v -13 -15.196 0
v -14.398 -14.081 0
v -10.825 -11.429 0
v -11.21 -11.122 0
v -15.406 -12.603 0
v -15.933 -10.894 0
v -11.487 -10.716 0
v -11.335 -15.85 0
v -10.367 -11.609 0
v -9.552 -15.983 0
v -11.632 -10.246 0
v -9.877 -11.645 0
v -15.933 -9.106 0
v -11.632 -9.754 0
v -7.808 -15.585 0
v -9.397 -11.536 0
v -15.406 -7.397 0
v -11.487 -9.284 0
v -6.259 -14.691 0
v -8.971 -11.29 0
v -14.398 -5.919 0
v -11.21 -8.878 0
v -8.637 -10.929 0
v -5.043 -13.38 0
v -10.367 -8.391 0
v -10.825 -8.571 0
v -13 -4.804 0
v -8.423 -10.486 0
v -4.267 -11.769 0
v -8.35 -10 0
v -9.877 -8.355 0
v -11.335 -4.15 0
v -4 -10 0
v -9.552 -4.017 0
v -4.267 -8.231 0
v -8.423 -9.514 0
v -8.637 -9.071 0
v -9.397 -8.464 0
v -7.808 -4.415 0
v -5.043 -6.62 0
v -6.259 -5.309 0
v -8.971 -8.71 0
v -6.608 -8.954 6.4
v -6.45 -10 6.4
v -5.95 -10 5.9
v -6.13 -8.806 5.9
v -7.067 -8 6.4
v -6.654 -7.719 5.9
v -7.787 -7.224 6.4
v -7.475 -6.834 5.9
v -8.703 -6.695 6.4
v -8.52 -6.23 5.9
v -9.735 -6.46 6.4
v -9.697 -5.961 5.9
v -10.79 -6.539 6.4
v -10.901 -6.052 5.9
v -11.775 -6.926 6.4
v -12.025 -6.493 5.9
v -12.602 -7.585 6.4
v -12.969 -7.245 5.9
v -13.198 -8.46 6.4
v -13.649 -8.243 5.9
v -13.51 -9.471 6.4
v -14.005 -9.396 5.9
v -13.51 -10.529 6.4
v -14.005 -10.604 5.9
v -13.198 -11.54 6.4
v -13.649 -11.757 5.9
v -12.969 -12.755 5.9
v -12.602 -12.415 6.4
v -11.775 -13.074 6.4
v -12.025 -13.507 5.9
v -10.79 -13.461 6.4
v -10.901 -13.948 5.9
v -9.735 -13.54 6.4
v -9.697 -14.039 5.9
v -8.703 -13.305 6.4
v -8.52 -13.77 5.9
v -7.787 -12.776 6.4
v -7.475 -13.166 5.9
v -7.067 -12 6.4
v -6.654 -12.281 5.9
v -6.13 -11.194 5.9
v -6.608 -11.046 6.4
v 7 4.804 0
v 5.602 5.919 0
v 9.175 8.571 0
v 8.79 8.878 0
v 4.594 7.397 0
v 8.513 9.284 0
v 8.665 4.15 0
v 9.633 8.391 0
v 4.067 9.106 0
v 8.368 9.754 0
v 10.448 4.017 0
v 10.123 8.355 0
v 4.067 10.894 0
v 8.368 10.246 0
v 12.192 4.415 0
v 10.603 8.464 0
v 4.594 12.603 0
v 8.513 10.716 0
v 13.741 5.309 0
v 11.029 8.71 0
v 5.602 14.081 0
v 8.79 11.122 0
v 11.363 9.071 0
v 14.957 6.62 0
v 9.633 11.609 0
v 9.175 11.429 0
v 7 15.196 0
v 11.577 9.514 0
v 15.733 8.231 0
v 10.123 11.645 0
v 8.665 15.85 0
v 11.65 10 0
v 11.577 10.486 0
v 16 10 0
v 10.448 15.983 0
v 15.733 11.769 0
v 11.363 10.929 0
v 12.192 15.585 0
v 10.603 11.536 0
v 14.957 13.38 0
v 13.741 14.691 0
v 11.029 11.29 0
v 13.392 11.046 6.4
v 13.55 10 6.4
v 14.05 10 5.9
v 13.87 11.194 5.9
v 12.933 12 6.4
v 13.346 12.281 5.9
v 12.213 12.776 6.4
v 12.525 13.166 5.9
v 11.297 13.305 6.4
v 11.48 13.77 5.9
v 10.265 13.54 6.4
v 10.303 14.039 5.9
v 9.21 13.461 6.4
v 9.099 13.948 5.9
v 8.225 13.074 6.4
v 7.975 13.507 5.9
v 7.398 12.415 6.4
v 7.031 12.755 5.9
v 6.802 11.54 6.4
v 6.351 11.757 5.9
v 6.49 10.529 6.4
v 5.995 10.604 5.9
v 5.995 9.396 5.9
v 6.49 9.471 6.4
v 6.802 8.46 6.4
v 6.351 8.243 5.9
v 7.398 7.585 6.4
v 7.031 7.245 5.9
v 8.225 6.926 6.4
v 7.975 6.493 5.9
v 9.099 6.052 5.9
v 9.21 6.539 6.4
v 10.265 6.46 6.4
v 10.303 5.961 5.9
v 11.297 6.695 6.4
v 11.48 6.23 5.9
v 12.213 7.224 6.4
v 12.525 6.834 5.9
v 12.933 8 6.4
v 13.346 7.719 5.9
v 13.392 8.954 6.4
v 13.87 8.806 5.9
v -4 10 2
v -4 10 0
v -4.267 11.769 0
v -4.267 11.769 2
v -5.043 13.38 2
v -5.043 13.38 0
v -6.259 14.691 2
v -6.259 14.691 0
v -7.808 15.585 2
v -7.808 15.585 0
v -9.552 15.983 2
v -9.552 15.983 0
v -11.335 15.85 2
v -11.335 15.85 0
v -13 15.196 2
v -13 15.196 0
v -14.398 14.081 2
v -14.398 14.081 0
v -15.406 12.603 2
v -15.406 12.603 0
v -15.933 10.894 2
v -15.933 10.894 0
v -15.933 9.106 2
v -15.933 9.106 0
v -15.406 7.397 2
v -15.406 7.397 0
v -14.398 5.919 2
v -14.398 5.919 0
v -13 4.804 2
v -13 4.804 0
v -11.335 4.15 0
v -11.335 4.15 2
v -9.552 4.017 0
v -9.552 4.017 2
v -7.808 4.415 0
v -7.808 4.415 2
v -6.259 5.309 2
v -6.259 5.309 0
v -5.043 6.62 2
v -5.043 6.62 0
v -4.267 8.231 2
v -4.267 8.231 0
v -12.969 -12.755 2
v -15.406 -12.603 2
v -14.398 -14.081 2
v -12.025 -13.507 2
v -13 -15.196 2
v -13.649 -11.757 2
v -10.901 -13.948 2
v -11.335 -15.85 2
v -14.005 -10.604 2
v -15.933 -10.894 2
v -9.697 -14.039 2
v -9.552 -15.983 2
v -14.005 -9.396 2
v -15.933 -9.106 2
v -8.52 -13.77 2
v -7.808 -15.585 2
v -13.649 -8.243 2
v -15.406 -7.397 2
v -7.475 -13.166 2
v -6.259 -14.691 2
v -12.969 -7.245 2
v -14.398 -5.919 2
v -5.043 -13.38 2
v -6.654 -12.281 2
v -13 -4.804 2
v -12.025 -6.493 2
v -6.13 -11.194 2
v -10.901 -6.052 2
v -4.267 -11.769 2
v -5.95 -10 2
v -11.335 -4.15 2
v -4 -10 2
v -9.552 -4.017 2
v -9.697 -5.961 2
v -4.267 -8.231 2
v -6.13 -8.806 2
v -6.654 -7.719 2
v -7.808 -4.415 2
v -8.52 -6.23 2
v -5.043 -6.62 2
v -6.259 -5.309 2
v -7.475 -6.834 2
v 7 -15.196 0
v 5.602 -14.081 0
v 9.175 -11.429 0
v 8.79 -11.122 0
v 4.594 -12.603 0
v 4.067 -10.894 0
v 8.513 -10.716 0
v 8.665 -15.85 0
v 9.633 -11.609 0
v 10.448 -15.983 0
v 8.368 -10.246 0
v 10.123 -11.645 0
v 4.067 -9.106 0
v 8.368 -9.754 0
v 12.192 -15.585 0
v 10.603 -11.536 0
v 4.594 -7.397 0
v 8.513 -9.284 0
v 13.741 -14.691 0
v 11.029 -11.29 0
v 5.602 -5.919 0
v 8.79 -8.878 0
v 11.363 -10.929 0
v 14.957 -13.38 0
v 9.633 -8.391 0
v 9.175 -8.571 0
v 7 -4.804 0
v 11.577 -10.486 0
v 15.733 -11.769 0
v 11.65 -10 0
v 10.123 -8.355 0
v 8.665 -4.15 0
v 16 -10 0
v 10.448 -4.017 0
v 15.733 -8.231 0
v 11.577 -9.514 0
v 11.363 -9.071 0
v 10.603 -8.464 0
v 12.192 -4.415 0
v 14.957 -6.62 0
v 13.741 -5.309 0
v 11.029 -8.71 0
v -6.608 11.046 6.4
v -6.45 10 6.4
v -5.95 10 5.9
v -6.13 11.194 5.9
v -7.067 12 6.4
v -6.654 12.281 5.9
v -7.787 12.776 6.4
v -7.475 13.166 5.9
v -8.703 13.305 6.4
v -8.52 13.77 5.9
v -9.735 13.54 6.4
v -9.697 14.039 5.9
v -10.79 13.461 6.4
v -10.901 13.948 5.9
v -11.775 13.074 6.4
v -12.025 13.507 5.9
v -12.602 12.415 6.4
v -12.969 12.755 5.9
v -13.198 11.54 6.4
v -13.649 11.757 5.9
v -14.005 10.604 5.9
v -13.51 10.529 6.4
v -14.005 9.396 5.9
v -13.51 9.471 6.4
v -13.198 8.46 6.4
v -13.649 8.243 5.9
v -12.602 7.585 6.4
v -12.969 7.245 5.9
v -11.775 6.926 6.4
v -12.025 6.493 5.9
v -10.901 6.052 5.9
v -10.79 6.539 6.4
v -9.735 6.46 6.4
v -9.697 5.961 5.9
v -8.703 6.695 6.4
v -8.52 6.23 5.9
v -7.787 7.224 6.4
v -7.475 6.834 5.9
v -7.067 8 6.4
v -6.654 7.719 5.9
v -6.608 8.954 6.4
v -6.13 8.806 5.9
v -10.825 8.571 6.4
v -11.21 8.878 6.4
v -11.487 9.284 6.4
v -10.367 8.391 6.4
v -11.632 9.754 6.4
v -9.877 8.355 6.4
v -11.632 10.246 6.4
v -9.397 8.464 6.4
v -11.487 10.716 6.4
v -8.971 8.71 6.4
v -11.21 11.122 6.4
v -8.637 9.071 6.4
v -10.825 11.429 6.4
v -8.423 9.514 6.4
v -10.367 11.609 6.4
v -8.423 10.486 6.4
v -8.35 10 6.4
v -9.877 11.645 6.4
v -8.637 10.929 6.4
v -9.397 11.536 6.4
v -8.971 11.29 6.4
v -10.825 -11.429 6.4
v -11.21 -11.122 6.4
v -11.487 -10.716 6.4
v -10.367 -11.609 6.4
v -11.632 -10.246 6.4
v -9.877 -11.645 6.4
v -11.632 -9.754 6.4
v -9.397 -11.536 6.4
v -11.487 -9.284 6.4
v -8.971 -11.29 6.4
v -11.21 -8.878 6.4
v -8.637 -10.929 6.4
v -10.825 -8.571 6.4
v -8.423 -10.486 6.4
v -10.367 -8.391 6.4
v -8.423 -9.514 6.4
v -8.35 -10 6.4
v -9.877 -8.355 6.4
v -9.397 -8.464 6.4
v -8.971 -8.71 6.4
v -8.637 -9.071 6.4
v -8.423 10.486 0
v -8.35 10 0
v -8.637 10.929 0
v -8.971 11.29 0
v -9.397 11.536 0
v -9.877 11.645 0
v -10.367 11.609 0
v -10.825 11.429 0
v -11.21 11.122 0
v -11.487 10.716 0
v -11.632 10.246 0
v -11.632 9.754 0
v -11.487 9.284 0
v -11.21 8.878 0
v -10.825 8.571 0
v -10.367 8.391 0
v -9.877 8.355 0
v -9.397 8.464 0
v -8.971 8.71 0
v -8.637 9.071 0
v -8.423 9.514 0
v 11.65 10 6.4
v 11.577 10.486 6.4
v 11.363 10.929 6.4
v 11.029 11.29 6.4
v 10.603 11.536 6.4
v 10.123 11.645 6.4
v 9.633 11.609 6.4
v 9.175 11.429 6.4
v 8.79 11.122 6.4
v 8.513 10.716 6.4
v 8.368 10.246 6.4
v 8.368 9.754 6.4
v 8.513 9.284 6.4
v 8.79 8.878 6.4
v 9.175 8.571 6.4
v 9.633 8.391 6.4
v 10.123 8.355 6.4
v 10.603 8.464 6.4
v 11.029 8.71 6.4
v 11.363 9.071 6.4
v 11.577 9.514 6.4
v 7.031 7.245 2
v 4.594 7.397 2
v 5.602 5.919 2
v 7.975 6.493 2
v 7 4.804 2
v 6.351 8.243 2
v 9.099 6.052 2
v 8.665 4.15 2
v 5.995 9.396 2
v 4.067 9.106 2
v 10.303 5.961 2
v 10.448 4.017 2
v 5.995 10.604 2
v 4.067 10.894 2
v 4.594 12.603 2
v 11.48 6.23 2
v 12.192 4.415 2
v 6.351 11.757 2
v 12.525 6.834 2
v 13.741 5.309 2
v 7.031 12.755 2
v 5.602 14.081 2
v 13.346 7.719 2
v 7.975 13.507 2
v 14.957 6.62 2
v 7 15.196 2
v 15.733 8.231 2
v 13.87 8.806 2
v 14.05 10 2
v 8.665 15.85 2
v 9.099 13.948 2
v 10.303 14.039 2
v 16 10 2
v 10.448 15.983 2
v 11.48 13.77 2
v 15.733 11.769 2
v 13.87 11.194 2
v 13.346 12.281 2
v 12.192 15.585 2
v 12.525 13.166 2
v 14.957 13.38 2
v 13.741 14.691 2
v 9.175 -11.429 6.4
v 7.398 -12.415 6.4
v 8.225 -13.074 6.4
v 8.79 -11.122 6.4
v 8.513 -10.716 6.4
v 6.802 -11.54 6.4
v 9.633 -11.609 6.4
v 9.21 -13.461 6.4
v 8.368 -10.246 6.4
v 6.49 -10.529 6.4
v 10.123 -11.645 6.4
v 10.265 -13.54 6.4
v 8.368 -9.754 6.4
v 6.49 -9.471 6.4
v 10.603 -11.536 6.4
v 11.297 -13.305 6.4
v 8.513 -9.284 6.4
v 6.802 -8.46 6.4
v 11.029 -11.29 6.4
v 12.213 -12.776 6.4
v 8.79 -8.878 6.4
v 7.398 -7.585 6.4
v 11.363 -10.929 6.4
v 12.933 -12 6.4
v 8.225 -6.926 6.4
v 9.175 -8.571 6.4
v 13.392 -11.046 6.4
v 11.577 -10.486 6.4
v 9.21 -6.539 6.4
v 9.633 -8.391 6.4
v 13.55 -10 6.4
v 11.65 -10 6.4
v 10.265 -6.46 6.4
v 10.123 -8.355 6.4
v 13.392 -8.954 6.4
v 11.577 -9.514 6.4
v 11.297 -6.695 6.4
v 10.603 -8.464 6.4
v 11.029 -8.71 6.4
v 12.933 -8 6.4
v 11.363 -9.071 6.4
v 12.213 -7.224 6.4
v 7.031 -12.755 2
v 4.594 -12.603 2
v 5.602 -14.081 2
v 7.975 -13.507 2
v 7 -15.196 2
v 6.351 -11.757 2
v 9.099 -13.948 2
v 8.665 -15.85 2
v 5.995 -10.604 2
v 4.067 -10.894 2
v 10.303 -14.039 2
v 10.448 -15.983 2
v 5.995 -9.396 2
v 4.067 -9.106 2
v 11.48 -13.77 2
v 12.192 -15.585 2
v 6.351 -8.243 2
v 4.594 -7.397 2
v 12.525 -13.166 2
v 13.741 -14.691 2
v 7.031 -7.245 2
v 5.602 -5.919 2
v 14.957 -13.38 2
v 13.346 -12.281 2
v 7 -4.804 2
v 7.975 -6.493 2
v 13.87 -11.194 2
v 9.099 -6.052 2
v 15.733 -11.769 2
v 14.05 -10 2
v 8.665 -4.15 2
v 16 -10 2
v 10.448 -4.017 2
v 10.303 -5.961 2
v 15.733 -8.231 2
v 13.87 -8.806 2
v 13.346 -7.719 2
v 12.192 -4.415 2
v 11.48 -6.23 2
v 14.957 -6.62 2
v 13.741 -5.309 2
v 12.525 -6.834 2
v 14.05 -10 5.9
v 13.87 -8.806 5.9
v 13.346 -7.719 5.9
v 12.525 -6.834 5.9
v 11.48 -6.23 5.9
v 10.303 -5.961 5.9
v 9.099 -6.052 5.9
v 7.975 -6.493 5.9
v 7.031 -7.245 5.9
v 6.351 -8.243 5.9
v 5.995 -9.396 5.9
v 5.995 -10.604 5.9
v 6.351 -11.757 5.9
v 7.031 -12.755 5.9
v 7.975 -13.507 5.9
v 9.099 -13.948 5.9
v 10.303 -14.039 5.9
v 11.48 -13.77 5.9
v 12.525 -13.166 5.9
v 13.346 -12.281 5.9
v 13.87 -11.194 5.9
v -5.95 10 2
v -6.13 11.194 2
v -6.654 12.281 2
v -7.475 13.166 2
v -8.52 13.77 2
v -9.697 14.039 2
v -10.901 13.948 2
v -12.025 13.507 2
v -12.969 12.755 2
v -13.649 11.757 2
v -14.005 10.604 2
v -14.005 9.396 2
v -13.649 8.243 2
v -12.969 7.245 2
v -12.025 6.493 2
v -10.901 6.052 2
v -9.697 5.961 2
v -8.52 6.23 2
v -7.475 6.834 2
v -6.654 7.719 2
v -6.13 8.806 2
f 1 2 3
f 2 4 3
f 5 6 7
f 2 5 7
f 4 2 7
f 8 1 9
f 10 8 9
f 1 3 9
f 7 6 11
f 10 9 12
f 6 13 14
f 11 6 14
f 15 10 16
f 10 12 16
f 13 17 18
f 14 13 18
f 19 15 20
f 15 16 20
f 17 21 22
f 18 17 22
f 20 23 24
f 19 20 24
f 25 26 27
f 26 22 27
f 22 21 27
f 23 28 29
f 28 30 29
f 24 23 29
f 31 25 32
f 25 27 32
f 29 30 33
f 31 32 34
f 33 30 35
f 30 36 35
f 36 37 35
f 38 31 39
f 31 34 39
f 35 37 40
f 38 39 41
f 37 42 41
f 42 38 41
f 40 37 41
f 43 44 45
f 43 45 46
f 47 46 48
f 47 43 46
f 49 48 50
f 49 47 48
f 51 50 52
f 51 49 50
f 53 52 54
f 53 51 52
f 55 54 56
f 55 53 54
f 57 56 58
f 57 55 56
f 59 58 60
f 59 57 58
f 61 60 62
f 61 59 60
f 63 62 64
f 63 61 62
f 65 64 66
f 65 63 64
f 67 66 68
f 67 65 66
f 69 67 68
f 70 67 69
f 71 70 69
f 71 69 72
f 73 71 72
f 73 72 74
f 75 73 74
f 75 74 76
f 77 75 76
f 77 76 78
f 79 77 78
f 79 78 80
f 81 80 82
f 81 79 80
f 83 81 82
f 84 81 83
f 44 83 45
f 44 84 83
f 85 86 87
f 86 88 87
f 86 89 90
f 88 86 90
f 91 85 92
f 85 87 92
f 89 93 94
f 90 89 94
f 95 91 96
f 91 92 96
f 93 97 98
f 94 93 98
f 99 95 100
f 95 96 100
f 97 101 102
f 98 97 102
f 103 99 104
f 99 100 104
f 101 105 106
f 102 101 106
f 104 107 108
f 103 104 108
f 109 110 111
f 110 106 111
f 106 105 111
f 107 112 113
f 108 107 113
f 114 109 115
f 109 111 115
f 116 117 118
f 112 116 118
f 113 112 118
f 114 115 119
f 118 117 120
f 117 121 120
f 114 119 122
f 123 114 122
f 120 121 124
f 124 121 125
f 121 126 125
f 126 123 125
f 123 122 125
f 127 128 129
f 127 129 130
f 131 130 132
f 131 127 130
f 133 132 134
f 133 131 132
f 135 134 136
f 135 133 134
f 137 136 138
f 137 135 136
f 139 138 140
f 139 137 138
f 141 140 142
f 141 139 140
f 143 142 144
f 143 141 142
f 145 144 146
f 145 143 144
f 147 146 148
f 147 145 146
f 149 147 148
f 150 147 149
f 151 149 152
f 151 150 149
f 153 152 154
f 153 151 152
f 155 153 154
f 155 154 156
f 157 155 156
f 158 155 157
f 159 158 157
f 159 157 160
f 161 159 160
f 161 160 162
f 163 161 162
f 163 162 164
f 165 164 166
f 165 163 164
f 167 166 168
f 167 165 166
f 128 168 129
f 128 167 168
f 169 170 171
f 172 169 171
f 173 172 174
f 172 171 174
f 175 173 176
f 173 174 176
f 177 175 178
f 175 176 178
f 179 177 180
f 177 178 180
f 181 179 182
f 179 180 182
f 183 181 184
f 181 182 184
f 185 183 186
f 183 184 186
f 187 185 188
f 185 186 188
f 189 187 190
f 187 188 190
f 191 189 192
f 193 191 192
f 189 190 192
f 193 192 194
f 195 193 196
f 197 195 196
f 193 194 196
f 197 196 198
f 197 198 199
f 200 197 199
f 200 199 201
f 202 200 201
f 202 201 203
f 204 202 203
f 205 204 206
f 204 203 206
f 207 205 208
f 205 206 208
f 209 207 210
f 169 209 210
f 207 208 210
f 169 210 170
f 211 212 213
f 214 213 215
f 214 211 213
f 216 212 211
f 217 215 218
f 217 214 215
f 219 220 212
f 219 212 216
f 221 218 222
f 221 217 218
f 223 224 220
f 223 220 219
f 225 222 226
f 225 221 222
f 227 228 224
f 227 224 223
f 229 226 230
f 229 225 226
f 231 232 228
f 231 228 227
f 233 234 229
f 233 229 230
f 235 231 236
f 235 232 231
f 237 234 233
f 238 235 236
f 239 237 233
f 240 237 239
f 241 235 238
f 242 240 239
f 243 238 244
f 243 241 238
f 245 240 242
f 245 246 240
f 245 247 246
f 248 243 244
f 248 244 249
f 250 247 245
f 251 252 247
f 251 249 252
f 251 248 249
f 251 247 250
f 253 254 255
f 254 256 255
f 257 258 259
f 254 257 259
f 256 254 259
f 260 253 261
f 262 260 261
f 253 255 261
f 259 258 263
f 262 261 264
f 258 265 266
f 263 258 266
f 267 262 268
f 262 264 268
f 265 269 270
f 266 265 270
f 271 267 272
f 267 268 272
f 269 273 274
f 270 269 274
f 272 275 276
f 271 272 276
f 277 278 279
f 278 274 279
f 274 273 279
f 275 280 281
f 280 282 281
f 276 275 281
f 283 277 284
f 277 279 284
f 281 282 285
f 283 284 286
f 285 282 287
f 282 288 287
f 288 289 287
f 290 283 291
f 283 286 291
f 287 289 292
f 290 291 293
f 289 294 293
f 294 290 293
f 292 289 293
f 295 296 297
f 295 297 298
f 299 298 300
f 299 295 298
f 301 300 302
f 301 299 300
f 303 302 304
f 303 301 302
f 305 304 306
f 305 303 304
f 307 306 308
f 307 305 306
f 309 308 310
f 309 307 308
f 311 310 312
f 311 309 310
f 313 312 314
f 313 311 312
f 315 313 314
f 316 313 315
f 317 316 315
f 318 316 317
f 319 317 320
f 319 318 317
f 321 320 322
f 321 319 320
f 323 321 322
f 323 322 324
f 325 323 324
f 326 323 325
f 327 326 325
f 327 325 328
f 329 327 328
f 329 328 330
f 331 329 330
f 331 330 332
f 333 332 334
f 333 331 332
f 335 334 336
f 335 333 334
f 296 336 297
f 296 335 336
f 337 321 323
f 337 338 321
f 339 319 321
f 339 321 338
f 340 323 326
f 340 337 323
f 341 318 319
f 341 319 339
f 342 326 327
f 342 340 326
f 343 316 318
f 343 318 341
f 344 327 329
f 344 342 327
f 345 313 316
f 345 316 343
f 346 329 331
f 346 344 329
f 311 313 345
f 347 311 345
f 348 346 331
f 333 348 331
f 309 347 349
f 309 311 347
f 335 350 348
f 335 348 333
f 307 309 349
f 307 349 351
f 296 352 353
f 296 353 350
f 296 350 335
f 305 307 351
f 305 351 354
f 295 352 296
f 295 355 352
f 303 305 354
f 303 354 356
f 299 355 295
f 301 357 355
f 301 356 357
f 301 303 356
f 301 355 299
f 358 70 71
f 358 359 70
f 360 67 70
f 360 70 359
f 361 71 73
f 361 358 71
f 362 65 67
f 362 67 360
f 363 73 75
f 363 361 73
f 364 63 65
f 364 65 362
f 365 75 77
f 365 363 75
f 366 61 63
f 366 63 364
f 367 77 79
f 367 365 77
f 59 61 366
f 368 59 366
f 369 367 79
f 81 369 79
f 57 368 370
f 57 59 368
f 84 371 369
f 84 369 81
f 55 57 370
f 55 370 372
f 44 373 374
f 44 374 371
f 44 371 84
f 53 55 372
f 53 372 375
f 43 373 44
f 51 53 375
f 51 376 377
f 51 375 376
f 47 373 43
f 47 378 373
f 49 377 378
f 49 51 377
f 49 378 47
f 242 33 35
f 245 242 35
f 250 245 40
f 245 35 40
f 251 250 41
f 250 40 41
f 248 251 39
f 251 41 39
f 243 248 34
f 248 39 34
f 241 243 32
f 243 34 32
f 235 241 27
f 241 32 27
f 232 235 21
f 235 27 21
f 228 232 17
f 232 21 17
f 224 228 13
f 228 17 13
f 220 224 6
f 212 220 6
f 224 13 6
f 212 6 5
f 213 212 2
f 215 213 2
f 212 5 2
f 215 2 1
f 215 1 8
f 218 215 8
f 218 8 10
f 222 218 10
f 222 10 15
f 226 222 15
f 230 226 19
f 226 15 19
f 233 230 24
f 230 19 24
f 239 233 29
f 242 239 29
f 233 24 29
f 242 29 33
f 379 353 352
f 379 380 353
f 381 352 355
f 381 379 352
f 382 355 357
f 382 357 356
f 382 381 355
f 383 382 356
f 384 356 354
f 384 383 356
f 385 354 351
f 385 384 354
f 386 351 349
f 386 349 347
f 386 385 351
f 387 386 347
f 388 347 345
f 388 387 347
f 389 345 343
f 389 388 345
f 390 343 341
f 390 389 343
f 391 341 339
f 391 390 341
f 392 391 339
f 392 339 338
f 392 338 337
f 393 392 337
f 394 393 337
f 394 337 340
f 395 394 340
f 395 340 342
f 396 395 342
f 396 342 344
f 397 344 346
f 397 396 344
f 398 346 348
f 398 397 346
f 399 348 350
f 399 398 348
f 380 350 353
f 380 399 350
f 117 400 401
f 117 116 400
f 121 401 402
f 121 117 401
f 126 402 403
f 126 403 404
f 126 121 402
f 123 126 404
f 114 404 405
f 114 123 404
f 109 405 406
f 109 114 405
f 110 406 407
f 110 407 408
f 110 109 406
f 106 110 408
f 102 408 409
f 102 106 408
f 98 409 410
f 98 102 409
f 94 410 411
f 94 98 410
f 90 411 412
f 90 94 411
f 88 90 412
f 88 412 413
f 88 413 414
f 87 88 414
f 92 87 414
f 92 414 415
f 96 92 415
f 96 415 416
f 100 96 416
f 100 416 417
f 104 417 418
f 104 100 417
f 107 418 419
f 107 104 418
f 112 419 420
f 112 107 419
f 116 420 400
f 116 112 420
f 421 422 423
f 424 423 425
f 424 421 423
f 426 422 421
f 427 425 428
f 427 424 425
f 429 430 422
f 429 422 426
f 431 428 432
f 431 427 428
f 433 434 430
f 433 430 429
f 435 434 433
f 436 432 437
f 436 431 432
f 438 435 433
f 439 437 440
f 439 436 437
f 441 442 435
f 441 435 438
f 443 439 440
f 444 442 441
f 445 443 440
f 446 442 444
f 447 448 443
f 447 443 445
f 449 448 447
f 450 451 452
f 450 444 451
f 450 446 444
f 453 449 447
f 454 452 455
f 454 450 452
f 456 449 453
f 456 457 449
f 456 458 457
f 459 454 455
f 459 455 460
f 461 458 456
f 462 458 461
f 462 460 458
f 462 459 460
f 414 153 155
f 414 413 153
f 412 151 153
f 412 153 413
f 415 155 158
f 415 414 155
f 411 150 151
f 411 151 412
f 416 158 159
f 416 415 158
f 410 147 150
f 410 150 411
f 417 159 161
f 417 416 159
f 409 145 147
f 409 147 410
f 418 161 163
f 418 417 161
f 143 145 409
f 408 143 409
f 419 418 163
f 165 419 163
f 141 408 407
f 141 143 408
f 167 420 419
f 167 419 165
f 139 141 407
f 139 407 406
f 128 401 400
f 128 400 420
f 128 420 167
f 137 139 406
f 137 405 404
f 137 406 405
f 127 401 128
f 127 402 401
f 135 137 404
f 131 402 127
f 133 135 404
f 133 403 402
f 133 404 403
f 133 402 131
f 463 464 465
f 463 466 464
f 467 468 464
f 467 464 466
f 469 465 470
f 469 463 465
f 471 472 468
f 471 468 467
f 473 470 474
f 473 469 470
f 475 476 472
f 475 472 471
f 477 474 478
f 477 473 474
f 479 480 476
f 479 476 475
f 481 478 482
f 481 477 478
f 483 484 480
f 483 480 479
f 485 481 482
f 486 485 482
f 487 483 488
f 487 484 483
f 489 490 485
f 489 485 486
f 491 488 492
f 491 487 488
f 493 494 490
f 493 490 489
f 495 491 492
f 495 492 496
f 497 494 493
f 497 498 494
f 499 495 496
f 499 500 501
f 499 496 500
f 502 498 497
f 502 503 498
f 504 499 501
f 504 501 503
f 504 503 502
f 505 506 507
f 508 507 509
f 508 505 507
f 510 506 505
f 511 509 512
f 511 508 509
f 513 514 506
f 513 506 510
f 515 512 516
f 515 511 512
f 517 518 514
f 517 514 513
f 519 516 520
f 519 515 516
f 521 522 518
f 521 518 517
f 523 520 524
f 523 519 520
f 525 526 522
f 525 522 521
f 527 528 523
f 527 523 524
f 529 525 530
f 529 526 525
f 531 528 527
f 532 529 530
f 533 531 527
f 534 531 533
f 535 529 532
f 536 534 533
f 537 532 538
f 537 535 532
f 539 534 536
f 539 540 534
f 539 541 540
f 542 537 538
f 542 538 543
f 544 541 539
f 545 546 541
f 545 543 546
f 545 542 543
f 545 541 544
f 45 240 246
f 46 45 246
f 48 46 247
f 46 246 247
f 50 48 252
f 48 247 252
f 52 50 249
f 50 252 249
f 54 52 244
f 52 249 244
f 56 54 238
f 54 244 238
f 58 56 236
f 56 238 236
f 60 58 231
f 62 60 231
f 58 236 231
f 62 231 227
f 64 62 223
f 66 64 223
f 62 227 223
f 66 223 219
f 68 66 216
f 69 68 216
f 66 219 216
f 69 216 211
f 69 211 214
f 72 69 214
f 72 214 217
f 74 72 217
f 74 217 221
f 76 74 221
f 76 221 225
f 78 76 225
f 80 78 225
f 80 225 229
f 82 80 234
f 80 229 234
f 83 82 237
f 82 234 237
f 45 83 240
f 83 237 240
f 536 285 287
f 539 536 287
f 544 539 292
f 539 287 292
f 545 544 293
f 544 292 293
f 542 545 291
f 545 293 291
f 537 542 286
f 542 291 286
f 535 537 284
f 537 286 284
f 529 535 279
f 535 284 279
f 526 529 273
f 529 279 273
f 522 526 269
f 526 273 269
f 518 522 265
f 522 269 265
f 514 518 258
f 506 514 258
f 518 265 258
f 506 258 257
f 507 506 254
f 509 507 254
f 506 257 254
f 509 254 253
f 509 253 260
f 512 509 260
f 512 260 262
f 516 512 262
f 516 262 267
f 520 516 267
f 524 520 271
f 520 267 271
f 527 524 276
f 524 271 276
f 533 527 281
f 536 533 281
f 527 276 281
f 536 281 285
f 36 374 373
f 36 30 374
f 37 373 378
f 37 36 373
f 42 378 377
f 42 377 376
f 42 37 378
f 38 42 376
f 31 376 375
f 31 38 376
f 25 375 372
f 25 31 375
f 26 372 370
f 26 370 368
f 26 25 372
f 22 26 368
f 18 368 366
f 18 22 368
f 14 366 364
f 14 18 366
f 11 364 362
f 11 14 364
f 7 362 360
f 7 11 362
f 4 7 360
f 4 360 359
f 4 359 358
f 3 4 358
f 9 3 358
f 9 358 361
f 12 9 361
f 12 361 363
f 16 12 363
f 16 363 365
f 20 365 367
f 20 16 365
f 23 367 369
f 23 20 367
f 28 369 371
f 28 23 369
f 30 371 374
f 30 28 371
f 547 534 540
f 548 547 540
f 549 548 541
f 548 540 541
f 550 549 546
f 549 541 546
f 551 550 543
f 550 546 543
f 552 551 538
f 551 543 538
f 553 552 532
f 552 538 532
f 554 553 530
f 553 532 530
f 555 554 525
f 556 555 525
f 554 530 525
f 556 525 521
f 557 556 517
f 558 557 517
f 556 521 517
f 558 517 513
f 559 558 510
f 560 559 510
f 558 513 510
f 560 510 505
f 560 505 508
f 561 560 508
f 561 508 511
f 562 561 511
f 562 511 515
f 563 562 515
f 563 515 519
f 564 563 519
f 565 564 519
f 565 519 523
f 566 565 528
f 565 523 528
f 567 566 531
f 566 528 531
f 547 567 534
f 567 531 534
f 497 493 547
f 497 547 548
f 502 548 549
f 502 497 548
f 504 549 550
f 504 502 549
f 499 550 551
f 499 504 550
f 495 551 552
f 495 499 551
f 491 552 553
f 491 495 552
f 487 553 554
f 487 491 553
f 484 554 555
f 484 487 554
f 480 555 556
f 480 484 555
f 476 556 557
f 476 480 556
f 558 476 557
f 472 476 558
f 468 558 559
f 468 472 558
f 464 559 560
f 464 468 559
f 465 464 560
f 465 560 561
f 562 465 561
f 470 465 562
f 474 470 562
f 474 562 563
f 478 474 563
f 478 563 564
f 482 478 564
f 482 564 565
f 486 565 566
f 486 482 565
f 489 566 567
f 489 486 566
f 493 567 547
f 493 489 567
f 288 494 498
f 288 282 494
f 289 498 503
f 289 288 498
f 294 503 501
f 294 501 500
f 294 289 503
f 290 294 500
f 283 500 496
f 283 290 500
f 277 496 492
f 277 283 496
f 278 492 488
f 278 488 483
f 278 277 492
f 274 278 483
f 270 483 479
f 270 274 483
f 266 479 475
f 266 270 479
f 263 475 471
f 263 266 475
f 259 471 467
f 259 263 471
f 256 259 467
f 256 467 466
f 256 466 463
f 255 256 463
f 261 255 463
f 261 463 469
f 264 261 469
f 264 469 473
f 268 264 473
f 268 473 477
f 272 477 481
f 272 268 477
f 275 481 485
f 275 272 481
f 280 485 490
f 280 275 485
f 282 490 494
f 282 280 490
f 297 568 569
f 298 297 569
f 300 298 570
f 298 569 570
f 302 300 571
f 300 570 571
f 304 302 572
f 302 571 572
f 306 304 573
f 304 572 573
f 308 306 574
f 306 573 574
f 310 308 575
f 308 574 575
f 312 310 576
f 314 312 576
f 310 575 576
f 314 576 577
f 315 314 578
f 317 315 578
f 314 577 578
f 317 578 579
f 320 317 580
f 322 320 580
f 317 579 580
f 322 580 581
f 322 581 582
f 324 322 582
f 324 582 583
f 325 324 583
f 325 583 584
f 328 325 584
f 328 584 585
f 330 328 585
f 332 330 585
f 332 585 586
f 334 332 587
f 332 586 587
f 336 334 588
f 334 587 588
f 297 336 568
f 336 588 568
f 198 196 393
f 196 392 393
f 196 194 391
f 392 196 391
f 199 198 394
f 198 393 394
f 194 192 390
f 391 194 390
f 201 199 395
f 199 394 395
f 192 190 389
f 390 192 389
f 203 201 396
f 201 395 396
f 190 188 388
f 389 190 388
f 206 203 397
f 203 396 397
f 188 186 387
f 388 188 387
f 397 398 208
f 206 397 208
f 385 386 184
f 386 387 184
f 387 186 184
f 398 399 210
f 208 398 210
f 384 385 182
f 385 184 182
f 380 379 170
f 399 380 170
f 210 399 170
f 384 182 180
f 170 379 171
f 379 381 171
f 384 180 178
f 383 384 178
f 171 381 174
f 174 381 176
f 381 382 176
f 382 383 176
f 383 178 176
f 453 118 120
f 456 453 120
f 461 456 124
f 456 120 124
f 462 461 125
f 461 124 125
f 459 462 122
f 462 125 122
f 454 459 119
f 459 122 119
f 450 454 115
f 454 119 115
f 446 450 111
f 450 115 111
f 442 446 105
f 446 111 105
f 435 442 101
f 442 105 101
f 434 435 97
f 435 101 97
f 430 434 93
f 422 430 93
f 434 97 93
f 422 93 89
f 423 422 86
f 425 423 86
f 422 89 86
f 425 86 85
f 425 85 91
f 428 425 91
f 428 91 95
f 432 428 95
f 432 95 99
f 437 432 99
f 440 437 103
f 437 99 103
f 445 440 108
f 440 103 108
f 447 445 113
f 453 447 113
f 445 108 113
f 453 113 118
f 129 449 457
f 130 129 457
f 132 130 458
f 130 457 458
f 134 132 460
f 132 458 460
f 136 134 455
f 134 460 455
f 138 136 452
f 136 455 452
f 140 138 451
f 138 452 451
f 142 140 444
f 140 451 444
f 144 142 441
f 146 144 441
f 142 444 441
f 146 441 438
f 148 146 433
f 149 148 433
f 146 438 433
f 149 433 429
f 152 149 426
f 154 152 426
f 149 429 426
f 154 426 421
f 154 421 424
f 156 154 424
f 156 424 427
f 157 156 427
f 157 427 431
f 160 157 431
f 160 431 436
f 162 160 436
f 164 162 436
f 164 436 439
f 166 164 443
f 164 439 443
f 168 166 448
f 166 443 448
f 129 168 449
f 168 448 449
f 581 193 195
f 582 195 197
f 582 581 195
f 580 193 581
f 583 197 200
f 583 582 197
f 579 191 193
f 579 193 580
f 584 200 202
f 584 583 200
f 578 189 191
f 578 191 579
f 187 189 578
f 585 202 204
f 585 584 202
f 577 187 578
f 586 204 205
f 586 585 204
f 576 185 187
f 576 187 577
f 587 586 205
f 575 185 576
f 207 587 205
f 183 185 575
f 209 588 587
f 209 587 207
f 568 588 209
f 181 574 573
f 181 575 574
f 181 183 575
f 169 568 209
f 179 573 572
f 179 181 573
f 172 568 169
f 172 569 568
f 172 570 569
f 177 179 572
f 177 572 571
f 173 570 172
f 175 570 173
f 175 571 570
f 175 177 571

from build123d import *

# Parameters (mm, degrees)
F0_R      = 6
F0_R_2    = 1.65
F1_DEPTH  = 2
F2_R      = 4.05
F2_R_2    = 1.65
F3_DEPTH  = 4.4
F4_SIZE   = 0.5
F4_2_SIZE = 0.5
F4_3_SIZE = 0.5
F4_4_SIZE = 0.5


with BuildPart() as f1:
    # F0 (on Top) → F1 (new body)
    with BuildSketch(Plane.XY):
        with Locations((-10, 10)):
            Circle(F0_R)
        with Locations((-10, 10)):
            Circle(F0_R_2, mode=Mode.SUBTRACT)
    extrude(amount=F1_DEPTH)

    # F2 (on face) → F3 (join)
    with BuildSketch(Plane.XY.offset(2)):
        with Locations((-10, 10)):
            Circle(F2_R)
        with Locations((-10, 10)):
            Circle(F2_R_2, mode=Mode.SUBTRACT)
    extrude(amount=F3_DEPTH)

    # F4#3
    f4_3_edges = [f1.edges().sort_by_distance(p)[0] for p in [
        (-14.05, 10, 6.4),
    ]]
    chamfer(f4_3_edges, length=F4_3_SIZE)


with BuildPart() as f1b:
    # F0 (on Top) → F1, piece 2 (new body)
    with BuildSketch(Plane.XY):
        with Locations((10, 10)):
            Circle(F0_R)
        with Locations((10, 10)):
            Circle(F0_R_2, mode=Mode.SUBTRACT)
    extrude(amount=F1_DEPTH)

    # F2 (on face) → F3, piece 2 (join)
    with BuildSketch(Plane.XY.offset(2)):
        with Locations((10, 10)):
            Circle(F2_R)
        with Locations((10, 10)):
            Circle(F2_R_2, mode=Mode.SUBTRACT)
    extrude(amount=F3_DEPTH)

    # F4#2
    f4_2_edges = [f1b.edges().sort_by_distance(p)[0] for p in [
        (5.95, 10, 6.4),
    ]]
    chamfer(f4_2_edges, length=F4_2_SIZE)


with BuildPart() as f1c:
    # F0 (on Top) → F1, piece 3 (new body)
    with BuildSketch(Plane.XY):
        with Locations((10, -10)):
            Circle(F0_R)
        with Locations((10, -10)):
            Circle(F0_R_2, mode=Mode.SUBTRACT)
    extrude(amount=F1_DEPTH)

    # F2 (on face) → F3, piece 3 (join)
    with BuildSketch(Plane.XY.offset(2)):
        with Locations((10, -10)):
            Circle(F2_R)
        with Locations((10, -10)):
            Circle(F2_R_2, mode=Mode.SUBTRACT)
    extrude(amount=F3_DEPTH)

    # F4
    f4_edges = [f1c.edges().sort_by_distance(p)[0] for p in [
        (5.95, -10, 6.4),
    ]]
    chamfer(f4_edges, length=F4_SIZE)


with BuildPart() as f1d:
    # F0 (on Top) → F1, piece 4 (new body)
    with BuildSketch(Plane.XY):
        with Locations((-10, -10)):
            Circle(F0_R)
        with Locations((-10, -10)):
            Circle(F0_R_2, mode=Mode.SUBTRACT)
    extrude(amount=F1_DEPTH)

    # F2 (on face) → F3, piece 4 (join)
    with BuildSketch(Plane.XY.offset(2)):
        with Locations((-10, -10)):
            Circle(F2_R)
        with Locations((-10, -10)):
            Circle(F2_R_2, mode=Mode.SUBTRACT)
    extrude(amount=F3_DEPTH)

    # F4#4
    f4_4_edges = [f1d.edges().sort_by_distance(p)[0] for p in [
        (-14.05, -10, 6.4),
    ]]
    chamfer(f4_4_edges, length=F4_4_SIZE)


solid = Compound([f1.part, f1b.part, f1c.part, f1d.part])
